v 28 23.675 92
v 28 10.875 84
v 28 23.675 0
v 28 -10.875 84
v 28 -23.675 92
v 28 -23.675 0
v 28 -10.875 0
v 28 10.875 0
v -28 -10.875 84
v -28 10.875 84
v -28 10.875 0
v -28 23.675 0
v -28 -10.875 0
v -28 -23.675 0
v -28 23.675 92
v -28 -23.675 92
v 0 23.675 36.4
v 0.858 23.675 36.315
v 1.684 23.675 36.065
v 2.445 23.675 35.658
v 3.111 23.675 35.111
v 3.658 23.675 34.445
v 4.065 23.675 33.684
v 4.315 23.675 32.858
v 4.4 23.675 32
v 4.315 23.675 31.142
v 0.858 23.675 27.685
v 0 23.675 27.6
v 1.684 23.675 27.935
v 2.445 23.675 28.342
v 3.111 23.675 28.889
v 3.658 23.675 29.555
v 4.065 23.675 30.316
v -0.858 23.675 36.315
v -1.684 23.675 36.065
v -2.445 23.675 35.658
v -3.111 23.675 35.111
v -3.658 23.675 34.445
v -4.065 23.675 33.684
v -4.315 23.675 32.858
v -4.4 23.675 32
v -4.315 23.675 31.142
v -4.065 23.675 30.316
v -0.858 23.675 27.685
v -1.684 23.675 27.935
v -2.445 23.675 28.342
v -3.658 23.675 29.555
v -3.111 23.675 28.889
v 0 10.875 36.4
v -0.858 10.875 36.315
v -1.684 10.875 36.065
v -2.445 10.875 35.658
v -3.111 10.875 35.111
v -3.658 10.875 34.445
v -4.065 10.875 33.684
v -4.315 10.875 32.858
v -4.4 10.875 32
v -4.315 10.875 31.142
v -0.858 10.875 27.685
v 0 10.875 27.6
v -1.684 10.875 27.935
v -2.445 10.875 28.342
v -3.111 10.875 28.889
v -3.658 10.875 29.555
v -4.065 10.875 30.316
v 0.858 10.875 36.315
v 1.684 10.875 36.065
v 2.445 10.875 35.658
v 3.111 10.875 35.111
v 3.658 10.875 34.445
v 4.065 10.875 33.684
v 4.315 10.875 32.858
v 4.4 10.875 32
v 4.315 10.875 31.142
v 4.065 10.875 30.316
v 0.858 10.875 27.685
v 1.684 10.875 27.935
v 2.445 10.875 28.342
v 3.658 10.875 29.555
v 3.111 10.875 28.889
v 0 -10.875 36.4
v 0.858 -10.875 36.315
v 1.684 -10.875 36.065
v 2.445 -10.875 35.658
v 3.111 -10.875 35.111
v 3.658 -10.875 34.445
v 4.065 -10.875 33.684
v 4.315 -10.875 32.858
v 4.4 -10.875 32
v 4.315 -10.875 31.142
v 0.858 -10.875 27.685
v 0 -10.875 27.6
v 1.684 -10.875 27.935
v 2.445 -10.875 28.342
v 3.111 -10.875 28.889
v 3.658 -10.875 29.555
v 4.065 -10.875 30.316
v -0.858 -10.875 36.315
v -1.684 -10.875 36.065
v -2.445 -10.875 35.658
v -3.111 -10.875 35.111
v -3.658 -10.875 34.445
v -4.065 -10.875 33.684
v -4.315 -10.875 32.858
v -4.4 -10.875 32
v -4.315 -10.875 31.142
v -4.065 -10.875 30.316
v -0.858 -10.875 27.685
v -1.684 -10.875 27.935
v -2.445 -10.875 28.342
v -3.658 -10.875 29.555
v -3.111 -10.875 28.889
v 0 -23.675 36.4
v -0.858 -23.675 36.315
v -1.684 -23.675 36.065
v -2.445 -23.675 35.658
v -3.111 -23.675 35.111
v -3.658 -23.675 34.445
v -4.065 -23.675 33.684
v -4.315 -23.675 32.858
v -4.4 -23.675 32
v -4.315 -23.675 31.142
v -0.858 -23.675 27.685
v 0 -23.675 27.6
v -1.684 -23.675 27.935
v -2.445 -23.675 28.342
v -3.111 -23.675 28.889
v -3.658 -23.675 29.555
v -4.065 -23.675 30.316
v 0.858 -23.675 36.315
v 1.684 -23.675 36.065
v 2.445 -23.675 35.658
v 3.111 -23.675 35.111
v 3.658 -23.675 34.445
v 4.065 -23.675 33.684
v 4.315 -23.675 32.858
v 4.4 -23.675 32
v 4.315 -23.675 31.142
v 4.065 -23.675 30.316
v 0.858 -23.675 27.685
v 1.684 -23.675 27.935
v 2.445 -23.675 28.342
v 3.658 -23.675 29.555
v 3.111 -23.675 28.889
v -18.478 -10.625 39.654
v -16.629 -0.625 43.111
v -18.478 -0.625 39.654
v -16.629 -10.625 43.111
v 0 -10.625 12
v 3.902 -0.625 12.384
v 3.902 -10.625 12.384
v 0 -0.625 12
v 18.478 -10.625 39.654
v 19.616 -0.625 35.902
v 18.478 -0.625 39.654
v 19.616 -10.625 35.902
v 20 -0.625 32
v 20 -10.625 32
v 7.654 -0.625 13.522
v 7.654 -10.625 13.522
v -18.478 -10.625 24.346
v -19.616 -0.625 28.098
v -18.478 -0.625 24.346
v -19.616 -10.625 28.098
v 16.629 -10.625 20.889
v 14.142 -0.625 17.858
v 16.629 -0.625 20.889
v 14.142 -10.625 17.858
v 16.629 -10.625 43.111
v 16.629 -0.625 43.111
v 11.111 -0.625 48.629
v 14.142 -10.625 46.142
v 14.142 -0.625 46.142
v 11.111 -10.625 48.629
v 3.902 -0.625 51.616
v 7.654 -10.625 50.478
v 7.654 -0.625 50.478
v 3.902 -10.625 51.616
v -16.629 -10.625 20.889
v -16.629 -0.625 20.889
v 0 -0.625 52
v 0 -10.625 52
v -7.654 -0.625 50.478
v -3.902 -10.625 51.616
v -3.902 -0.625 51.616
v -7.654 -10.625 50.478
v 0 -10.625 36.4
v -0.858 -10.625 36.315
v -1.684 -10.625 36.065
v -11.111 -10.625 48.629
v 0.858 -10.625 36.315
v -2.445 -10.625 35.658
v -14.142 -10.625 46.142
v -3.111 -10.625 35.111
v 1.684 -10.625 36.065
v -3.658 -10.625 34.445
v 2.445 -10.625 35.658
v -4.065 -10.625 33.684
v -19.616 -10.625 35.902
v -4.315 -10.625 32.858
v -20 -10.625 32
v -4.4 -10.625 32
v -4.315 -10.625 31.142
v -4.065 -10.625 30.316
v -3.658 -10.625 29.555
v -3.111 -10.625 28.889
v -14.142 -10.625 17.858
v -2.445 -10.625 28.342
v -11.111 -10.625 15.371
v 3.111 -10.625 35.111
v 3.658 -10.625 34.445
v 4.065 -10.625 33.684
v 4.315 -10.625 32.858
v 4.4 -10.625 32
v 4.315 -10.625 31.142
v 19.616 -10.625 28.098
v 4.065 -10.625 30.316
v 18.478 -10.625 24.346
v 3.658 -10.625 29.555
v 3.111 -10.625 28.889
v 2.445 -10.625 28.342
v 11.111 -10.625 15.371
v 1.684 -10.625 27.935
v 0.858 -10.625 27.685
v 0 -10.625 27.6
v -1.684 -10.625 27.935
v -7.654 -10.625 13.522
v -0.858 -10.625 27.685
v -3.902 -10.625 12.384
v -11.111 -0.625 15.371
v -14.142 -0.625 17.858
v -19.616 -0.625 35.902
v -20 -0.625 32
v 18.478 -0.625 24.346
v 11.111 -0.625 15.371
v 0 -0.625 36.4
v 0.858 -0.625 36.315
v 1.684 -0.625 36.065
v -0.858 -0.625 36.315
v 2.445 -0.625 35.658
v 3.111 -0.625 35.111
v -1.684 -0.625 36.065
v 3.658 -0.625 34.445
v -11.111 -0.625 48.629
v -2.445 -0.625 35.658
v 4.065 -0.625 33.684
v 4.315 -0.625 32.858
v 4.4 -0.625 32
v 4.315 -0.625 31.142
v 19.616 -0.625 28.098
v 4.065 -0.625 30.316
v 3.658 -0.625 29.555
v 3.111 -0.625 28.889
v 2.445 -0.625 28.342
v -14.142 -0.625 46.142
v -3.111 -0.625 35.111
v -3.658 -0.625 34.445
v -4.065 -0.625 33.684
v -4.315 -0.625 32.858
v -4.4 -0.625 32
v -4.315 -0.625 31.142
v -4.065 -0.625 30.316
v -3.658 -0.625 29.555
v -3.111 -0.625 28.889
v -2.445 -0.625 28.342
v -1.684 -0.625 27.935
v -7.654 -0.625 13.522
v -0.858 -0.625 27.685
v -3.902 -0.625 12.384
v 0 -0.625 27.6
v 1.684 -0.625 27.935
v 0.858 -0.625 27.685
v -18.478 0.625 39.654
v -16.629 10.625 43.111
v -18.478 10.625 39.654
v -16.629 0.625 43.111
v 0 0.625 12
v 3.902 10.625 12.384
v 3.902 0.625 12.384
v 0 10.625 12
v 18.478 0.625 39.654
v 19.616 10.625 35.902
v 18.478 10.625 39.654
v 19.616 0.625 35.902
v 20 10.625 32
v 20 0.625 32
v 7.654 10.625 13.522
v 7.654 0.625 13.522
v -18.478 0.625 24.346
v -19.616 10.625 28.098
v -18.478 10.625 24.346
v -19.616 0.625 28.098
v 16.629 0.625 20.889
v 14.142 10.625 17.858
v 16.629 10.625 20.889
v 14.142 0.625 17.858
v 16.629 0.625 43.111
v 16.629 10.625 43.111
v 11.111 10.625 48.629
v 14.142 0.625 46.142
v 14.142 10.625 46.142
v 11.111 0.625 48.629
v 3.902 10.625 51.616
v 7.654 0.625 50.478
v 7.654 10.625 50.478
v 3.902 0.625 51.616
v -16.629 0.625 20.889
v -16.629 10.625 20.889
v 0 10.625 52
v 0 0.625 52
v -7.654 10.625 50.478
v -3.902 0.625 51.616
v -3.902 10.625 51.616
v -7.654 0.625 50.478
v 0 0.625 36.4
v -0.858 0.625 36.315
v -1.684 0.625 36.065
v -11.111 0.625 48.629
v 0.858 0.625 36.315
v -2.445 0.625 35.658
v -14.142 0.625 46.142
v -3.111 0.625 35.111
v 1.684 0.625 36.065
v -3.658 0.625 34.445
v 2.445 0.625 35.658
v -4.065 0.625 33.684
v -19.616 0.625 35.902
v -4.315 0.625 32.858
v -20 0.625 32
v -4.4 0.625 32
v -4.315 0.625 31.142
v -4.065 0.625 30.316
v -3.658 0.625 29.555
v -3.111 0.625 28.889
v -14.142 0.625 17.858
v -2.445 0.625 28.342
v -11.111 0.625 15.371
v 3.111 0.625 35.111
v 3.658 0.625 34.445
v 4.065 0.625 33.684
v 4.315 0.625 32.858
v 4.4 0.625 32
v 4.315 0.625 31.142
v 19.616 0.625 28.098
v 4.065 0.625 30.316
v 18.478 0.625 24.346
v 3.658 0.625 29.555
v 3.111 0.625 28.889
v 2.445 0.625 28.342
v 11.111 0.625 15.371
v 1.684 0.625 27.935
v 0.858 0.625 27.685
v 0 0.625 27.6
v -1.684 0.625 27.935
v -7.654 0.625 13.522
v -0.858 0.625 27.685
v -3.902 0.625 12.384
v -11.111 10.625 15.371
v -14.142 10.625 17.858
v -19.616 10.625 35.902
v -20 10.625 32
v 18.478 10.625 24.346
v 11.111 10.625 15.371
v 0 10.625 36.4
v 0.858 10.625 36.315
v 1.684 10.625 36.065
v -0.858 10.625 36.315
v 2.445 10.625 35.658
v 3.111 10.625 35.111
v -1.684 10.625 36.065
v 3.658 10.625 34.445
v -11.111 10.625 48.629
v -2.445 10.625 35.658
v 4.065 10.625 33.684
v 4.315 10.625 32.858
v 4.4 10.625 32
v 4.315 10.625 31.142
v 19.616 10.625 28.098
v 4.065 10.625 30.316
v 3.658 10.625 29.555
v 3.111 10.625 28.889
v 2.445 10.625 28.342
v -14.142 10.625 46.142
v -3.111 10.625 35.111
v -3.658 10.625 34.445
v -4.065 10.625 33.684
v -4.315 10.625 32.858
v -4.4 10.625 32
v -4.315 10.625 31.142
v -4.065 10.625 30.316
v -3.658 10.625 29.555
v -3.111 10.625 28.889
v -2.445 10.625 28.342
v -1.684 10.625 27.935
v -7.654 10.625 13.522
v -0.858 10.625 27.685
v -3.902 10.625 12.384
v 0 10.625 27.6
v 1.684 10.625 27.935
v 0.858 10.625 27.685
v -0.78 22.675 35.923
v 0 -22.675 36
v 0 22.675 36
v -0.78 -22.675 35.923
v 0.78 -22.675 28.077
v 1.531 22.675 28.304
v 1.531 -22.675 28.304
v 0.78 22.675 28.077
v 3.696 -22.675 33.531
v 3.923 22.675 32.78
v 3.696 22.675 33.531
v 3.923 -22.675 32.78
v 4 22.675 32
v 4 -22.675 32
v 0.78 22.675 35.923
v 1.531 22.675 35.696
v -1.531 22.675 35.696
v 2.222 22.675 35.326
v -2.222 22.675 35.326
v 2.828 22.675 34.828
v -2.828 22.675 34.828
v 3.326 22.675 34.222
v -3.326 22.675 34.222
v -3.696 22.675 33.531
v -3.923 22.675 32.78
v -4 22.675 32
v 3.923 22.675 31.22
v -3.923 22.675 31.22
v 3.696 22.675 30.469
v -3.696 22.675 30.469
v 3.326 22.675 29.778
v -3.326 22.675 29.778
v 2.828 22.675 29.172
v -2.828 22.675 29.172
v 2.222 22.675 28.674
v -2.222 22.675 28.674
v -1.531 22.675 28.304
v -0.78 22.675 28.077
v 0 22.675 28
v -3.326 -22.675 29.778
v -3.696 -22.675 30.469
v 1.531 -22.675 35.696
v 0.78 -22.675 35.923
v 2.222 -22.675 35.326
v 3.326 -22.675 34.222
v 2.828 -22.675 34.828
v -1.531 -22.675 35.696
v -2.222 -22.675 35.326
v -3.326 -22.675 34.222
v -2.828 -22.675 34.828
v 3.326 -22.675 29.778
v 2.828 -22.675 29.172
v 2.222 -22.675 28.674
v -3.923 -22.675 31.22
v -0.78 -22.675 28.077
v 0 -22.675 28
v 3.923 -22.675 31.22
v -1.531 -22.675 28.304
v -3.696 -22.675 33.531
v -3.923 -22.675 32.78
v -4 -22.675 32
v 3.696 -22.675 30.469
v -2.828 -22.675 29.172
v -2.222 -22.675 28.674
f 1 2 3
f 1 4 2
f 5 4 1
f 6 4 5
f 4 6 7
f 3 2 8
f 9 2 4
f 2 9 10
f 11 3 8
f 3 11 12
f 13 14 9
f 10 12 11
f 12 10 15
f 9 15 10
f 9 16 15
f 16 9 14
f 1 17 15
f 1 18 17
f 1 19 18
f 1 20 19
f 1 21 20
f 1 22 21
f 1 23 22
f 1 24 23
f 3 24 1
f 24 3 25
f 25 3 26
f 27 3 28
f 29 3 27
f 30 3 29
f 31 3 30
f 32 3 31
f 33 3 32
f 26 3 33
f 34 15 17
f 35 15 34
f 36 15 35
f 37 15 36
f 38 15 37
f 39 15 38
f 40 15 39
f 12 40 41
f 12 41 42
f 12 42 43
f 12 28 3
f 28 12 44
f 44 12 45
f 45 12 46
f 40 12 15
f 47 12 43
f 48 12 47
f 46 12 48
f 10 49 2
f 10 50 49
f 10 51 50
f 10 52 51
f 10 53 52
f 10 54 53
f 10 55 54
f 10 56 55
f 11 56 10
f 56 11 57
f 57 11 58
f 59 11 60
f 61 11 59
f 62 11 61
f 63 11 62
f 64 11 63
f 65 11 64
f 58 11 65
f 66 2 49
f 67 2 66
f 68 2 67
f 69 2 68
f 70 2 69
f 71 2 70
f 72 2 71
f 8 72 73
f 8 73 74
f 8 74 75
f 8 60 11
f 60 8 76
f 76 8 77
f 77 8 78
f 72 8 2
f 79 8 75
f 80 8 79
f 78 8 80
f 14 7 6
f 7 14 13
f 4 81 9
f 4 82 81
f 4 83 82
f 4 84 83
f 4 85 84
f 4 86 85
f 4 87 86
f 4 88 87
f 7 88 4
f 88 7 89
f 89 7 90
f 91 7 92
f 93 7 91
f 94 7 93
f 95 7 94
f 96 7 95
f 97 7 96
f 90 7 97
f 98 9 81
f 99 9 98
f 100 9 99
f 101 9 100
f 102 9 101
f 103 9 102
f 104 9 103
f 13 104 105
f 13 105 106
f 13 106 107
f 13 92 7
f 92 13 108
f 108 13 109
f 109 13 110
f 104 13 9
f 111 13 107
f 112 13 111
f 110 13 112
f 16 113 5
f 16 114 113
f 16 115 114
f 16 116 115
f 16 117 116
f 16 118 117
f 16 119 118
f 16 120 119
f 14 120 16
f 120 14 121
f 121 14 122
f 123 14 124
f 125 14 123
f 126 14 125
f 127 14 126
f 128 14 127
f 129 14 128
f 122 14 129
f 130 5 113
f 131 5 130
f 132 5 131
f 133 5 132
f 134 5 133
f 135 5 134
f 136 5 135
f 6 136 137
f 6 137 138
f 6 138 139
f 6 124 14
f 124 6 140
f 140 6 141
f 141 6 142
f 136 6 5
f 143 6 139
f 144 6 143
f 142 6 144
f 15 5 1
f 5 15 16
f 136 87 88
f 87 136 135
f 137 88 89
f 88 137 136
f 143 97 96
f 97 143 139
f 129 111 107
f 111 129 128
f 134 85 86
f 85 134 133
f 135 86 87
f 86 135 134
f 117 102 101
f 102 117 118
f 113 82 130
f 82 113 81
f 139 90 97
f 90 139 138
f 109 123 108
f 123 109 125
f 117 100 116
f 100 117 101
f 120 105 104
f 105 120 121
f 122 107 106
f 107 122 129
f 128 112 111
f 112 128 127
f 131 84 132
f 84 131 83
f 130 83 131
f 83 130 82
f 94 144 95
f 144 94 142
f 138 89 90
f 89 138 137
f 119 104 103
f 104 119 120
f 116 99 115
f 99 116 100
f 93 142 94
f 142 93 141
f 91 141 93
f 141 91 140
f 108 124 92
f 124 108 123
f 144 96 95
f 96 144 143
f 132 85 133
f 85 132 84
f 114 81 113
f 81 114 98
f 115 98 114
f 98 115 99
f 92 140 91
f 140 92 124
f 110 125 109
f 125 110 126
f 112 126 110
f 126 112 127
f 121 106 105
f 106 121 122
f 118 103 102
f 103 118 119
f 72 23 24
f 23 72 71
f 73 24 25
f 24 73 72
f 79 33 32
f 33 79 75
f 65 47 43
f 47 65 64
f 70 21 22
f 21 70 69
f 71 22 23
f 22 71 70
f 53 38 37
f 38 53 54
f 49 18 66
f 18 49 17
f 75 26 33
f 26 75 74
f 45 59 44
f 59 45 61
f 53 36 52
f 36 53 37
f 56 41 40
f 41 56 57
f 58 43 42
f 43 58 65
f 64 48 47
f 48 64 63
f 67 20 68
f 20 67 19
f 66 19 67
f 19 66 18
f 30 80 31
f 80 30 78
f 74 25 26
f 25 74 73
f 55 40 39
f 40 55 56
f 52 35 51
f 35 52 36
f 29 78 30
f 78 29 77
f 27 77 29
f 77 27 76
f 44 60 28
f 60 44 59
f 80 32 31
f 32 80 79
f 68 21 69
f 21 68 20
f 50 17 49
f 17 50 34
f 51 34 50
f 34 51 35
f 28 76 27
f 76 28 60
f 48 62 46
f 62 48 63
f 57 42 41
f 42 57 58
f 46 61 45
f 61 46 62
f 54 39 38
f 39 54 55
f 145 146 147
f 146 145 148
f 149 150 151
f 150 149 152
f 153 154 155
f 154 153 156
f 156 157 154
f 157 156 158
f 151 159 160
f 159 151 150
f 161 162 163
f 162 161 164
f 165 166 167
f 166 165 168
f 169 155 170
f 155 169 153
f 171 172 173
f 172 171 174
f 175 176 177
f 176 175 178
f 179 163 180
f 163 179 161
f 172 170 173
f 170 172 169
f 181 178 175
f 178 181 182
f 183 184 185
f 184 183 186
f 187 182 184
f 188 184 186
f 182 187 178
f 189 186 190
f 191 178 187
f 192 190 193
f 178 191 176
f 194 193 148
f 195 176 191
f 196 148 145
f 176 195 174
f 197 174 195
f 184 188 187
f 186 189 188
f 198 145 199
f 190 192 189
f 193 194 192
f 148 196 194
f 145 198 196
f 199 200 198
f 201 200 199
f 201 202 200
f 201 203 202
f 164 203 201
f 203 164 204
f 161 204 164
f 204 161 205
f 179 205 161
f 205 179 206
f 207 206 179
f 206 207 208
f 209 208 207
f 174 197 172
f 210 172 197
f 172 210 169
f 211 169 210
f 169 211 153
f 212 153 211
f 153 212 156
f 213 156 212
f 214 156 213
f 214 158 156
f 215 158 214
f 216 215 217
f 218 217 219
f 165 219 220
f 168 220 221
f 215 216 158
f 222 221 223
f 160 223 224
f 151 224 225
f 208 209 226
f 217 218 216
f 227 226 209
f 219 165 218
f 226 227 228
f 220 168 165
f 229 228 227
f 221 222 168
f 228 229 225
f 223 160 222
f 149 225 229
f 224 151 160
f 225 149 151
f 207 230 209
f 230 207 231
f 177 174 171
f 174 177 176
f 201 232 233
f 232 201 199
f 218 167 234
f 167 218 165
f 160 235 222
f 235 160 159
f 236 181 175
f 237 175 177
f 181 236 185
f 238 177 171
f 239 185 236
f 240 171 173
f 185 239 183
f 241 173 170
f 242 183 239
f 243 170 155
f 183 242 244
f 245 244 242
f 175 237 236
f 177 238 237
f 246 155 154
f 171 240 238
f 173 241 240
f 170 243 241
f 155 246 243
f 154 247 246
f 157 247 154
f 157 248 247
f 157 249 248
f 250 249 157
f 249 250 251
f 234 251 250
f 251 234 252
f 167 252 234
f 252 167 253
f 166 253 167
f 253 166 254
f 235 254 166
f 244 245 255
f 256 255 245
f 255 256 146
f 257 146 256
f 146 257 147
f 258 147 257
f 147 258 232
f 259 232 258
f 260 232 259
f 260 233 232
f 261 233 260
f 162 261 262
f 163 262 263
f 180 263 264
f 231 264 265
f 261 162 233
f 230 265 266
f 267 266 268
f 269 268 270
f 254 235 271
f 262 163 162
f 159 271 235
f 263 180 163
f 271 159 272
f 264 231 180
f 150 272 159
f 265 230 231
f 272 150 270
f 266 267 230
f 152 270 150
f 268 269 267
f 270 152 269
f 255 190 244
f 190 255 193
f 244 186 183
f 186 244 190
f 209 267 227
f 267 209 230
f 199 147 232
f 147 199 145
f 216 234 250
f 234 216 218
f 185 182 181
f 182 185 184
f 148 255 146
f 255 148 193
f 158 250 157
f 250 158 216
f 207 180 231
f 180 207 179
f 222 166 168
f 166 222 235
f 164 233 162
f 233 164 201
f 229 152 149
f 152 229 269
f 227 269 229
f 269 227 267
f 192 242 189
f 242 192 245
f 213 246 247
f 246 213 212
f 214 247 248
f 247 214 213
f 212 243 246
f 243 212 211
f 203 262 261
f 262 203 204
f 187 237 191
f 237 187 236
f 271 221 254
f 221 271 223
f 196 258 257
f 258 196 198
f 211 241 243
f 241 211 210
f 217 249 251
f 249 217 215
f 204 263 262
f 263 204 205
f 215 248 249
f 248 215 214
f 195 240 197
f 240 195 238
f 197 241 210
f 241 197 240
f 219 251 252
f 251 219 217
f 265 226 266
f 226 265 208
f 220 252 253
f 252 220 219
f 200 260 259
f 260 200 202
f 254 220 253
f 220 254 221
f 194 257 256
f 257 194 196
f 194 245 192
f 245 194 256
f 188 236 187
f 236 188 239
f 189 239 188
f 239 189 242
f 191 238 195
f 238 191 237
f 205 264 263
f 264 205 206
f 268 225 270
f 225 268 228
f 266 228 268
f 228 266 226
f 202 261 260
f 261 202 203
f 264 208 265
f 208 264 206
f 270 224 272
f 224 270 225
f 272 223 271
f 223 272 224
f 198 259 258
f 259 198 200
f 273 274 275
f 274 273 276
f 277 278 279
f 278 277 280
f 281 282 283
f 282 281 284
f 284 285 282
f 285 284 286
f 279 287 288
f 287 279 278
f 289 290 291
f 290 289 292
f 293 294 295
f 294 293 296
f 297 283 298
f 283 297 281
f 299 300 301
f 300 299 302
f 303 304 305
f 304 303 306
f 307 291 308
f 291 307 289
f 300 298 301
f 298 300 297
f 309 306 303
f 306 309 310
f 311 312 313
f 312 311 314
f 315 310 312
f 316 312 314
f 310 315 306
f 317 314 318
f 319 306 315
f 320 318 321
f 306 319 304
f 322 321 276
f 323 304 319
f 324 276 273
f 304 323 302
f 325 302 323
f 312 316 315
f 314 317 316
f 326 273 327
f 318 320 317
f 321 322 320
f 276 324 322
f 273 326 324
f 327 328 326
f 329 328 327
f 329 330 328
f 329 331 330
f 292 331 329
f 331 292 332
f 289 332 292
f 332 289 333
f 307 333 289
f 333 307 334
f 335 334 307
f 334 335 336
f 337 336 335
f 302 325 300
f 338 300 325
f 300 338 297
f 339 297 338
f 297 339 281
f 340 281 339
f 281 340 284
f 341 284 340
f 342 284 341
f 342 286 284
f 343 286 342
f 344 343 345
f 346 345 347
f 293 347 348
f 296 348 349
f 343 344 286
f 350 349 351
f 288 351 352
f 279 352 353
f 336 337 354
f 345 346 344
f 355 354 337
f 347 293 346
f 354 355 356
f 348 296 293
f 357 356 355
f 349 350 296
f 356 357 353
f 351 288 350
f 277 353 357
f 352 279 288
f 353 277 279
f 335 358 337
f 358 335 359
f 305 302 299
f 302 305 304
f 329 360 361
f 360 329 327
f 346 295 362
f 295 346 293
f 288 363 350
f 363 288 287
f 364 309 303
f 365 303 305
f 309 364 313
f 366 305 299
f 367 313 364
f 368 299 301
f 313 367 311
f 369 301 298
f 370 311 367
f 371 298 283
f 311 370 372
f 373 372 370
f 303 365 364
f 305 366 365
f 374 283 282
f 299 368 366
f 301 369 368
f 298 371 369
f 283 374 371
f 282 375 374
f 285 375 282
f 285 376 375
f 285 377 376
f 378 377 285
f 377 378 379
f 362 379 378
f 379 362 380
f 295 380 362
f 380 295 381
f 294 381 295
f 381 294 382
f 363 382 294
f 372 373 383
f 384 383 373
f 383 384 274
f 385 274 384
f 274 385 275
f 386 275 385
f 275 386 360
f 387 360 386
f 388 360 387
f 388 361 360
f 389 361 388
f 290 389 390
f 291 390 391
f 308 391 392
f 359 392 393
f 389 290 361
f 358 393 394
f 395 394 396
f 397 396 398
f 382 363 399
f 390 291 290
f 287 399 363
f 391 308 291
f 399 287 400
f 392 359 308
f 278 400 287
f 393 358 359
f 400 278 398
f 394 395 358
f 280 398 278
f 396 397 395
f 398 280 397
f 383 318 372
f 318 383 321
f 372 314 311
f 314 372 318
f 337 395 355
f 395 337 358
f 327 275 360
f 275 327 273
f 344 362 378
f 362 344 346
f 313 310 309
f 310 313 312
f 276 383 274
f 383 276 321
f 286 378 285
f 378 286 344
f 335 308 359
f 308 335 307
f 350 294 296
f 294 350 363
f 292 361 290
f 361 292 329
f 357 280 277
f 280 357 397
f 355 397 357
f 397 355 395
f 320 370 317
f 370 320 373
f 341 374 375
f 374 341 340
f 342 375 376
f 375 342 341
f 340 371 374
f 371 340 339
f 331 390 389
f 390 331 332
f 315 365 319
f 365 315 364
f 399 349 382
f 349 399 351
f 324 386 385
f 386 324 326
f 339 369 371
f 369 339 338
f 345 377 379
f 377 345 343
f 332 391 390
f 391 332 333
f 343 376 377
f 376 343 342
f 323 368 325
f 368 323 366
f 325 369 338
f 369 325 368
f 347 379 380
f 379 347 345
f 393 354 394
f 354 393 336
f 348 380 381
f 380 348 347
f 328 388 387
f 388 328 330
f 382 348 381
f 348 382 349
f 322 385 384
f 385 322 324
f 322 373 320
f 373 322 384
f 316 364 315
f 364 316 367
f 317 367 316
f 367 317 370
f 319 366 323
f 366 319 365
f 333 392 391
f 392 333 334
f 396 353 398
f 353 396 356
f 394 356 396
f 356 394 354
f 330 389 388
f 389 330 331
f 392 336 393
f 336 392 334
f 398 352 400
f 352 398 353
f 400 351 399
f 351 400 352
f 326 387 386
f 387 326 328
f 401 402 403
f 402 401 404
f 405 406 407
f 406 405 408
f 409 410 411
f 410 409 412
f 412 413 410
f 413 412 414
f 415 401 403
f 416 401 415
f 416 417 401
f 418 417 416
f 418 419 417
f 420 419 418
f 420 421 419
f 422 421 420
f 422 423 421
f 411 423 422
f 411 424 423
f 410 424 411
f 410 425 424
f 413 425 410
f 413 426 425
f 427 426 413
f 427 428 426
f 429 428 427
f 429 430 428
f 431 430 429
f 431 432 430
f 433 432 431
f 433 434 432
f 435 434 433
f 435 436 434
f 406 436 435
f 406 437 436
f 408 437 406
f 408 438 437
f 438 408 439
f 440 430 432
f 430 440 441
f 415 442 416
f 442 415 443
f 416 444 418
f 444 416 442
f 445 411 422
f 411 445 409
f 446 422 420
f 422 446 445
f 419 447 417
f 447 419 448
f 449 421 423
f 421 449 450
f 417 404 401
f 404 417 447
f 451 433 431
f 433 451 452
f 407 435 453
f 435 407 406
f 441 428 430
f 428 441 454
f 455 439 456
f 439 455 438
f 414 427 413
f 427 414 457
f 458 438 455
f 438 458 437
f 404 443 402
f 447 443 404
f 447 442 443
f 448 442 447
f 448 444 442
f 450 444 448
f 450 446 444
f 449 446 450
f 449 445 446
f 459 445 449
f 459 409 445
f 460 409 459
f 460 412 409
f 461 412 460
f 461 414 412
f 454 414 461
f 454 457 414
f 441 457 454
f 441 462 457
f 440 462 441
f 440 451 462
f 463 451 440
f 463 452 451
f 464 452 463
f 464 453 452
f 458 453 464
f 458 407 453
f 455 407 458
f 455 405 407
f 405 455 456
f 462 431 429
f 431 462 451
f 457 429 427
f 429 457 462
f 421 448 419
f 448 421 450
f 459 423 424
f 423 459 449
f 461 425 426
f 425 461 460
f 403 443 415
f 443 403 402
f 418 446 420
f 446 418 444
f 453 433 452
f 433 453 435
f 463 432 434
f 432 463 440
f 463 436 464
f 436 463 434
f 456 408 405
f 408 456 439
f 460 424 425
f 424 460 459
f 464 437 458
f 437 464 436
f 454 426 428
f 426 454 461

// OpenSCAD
$fn = 32;

// ------------------------------------------------------------------------
// Trolley wheel set: wheels d40, fork 84 mm tall
// Every part is its own module, assembly() places every instance.
// ------------------------------------------------------------------------

// --- part 1 ---
module trolley_fork() {
  difference() {
    union() {
      translate([-28, 10.875, 0]) cube([56, 12.8, 84]);
      translate([-28, -23.675, 0]) cube([56, 12.8, 84]);
      translate([-28, -23.675, 84]) cube([56, 47.35, 8]);
    }
    translate([0, -17.275, 32]) rotate([90, 0, 0]) cylinder(h = 14.8, d = 8.8, center = true);
    translate([0, 17.275, 32]) rotate([90, 0, 0]) cylinder(h = 14.8, d = 8.8, center = true);
  }
}

// --- part 2 ---
module trolley_wheel() {
  difference() {
      translate([0, 0, 0]) cylinder(h = 10, d = 40);
      translate([0, 0, -1]) cylinder(h = 12, d = 8.8);
    }
}

// --- part 3 ---
module trolley_axle() {
  translate([0, 0, -22.675]) cylinder(h = 45.35, d = 8);
}

// --- assembly ---
module assembly() {
  color([0.80, 0.24, 0.20]) translate([0, 0, 0]) rotate([0, 0, 0]) trolley_fork();
  color([0.20, 0.45, 0.75]) translate([0, -0.625, 32]) rotate([90, 0, 0]) trolley_wheel();
  color([0.25, 0.62, 0.32]) translate([0, 10.625, 32]) rotate([90, 0, 0]) trolley_wheel();
  color([0.92, 0.70, 0.18]) translate([0, 0, 32]) rotate([90, 0, 0]) trolley_axle();
}

assembly();
